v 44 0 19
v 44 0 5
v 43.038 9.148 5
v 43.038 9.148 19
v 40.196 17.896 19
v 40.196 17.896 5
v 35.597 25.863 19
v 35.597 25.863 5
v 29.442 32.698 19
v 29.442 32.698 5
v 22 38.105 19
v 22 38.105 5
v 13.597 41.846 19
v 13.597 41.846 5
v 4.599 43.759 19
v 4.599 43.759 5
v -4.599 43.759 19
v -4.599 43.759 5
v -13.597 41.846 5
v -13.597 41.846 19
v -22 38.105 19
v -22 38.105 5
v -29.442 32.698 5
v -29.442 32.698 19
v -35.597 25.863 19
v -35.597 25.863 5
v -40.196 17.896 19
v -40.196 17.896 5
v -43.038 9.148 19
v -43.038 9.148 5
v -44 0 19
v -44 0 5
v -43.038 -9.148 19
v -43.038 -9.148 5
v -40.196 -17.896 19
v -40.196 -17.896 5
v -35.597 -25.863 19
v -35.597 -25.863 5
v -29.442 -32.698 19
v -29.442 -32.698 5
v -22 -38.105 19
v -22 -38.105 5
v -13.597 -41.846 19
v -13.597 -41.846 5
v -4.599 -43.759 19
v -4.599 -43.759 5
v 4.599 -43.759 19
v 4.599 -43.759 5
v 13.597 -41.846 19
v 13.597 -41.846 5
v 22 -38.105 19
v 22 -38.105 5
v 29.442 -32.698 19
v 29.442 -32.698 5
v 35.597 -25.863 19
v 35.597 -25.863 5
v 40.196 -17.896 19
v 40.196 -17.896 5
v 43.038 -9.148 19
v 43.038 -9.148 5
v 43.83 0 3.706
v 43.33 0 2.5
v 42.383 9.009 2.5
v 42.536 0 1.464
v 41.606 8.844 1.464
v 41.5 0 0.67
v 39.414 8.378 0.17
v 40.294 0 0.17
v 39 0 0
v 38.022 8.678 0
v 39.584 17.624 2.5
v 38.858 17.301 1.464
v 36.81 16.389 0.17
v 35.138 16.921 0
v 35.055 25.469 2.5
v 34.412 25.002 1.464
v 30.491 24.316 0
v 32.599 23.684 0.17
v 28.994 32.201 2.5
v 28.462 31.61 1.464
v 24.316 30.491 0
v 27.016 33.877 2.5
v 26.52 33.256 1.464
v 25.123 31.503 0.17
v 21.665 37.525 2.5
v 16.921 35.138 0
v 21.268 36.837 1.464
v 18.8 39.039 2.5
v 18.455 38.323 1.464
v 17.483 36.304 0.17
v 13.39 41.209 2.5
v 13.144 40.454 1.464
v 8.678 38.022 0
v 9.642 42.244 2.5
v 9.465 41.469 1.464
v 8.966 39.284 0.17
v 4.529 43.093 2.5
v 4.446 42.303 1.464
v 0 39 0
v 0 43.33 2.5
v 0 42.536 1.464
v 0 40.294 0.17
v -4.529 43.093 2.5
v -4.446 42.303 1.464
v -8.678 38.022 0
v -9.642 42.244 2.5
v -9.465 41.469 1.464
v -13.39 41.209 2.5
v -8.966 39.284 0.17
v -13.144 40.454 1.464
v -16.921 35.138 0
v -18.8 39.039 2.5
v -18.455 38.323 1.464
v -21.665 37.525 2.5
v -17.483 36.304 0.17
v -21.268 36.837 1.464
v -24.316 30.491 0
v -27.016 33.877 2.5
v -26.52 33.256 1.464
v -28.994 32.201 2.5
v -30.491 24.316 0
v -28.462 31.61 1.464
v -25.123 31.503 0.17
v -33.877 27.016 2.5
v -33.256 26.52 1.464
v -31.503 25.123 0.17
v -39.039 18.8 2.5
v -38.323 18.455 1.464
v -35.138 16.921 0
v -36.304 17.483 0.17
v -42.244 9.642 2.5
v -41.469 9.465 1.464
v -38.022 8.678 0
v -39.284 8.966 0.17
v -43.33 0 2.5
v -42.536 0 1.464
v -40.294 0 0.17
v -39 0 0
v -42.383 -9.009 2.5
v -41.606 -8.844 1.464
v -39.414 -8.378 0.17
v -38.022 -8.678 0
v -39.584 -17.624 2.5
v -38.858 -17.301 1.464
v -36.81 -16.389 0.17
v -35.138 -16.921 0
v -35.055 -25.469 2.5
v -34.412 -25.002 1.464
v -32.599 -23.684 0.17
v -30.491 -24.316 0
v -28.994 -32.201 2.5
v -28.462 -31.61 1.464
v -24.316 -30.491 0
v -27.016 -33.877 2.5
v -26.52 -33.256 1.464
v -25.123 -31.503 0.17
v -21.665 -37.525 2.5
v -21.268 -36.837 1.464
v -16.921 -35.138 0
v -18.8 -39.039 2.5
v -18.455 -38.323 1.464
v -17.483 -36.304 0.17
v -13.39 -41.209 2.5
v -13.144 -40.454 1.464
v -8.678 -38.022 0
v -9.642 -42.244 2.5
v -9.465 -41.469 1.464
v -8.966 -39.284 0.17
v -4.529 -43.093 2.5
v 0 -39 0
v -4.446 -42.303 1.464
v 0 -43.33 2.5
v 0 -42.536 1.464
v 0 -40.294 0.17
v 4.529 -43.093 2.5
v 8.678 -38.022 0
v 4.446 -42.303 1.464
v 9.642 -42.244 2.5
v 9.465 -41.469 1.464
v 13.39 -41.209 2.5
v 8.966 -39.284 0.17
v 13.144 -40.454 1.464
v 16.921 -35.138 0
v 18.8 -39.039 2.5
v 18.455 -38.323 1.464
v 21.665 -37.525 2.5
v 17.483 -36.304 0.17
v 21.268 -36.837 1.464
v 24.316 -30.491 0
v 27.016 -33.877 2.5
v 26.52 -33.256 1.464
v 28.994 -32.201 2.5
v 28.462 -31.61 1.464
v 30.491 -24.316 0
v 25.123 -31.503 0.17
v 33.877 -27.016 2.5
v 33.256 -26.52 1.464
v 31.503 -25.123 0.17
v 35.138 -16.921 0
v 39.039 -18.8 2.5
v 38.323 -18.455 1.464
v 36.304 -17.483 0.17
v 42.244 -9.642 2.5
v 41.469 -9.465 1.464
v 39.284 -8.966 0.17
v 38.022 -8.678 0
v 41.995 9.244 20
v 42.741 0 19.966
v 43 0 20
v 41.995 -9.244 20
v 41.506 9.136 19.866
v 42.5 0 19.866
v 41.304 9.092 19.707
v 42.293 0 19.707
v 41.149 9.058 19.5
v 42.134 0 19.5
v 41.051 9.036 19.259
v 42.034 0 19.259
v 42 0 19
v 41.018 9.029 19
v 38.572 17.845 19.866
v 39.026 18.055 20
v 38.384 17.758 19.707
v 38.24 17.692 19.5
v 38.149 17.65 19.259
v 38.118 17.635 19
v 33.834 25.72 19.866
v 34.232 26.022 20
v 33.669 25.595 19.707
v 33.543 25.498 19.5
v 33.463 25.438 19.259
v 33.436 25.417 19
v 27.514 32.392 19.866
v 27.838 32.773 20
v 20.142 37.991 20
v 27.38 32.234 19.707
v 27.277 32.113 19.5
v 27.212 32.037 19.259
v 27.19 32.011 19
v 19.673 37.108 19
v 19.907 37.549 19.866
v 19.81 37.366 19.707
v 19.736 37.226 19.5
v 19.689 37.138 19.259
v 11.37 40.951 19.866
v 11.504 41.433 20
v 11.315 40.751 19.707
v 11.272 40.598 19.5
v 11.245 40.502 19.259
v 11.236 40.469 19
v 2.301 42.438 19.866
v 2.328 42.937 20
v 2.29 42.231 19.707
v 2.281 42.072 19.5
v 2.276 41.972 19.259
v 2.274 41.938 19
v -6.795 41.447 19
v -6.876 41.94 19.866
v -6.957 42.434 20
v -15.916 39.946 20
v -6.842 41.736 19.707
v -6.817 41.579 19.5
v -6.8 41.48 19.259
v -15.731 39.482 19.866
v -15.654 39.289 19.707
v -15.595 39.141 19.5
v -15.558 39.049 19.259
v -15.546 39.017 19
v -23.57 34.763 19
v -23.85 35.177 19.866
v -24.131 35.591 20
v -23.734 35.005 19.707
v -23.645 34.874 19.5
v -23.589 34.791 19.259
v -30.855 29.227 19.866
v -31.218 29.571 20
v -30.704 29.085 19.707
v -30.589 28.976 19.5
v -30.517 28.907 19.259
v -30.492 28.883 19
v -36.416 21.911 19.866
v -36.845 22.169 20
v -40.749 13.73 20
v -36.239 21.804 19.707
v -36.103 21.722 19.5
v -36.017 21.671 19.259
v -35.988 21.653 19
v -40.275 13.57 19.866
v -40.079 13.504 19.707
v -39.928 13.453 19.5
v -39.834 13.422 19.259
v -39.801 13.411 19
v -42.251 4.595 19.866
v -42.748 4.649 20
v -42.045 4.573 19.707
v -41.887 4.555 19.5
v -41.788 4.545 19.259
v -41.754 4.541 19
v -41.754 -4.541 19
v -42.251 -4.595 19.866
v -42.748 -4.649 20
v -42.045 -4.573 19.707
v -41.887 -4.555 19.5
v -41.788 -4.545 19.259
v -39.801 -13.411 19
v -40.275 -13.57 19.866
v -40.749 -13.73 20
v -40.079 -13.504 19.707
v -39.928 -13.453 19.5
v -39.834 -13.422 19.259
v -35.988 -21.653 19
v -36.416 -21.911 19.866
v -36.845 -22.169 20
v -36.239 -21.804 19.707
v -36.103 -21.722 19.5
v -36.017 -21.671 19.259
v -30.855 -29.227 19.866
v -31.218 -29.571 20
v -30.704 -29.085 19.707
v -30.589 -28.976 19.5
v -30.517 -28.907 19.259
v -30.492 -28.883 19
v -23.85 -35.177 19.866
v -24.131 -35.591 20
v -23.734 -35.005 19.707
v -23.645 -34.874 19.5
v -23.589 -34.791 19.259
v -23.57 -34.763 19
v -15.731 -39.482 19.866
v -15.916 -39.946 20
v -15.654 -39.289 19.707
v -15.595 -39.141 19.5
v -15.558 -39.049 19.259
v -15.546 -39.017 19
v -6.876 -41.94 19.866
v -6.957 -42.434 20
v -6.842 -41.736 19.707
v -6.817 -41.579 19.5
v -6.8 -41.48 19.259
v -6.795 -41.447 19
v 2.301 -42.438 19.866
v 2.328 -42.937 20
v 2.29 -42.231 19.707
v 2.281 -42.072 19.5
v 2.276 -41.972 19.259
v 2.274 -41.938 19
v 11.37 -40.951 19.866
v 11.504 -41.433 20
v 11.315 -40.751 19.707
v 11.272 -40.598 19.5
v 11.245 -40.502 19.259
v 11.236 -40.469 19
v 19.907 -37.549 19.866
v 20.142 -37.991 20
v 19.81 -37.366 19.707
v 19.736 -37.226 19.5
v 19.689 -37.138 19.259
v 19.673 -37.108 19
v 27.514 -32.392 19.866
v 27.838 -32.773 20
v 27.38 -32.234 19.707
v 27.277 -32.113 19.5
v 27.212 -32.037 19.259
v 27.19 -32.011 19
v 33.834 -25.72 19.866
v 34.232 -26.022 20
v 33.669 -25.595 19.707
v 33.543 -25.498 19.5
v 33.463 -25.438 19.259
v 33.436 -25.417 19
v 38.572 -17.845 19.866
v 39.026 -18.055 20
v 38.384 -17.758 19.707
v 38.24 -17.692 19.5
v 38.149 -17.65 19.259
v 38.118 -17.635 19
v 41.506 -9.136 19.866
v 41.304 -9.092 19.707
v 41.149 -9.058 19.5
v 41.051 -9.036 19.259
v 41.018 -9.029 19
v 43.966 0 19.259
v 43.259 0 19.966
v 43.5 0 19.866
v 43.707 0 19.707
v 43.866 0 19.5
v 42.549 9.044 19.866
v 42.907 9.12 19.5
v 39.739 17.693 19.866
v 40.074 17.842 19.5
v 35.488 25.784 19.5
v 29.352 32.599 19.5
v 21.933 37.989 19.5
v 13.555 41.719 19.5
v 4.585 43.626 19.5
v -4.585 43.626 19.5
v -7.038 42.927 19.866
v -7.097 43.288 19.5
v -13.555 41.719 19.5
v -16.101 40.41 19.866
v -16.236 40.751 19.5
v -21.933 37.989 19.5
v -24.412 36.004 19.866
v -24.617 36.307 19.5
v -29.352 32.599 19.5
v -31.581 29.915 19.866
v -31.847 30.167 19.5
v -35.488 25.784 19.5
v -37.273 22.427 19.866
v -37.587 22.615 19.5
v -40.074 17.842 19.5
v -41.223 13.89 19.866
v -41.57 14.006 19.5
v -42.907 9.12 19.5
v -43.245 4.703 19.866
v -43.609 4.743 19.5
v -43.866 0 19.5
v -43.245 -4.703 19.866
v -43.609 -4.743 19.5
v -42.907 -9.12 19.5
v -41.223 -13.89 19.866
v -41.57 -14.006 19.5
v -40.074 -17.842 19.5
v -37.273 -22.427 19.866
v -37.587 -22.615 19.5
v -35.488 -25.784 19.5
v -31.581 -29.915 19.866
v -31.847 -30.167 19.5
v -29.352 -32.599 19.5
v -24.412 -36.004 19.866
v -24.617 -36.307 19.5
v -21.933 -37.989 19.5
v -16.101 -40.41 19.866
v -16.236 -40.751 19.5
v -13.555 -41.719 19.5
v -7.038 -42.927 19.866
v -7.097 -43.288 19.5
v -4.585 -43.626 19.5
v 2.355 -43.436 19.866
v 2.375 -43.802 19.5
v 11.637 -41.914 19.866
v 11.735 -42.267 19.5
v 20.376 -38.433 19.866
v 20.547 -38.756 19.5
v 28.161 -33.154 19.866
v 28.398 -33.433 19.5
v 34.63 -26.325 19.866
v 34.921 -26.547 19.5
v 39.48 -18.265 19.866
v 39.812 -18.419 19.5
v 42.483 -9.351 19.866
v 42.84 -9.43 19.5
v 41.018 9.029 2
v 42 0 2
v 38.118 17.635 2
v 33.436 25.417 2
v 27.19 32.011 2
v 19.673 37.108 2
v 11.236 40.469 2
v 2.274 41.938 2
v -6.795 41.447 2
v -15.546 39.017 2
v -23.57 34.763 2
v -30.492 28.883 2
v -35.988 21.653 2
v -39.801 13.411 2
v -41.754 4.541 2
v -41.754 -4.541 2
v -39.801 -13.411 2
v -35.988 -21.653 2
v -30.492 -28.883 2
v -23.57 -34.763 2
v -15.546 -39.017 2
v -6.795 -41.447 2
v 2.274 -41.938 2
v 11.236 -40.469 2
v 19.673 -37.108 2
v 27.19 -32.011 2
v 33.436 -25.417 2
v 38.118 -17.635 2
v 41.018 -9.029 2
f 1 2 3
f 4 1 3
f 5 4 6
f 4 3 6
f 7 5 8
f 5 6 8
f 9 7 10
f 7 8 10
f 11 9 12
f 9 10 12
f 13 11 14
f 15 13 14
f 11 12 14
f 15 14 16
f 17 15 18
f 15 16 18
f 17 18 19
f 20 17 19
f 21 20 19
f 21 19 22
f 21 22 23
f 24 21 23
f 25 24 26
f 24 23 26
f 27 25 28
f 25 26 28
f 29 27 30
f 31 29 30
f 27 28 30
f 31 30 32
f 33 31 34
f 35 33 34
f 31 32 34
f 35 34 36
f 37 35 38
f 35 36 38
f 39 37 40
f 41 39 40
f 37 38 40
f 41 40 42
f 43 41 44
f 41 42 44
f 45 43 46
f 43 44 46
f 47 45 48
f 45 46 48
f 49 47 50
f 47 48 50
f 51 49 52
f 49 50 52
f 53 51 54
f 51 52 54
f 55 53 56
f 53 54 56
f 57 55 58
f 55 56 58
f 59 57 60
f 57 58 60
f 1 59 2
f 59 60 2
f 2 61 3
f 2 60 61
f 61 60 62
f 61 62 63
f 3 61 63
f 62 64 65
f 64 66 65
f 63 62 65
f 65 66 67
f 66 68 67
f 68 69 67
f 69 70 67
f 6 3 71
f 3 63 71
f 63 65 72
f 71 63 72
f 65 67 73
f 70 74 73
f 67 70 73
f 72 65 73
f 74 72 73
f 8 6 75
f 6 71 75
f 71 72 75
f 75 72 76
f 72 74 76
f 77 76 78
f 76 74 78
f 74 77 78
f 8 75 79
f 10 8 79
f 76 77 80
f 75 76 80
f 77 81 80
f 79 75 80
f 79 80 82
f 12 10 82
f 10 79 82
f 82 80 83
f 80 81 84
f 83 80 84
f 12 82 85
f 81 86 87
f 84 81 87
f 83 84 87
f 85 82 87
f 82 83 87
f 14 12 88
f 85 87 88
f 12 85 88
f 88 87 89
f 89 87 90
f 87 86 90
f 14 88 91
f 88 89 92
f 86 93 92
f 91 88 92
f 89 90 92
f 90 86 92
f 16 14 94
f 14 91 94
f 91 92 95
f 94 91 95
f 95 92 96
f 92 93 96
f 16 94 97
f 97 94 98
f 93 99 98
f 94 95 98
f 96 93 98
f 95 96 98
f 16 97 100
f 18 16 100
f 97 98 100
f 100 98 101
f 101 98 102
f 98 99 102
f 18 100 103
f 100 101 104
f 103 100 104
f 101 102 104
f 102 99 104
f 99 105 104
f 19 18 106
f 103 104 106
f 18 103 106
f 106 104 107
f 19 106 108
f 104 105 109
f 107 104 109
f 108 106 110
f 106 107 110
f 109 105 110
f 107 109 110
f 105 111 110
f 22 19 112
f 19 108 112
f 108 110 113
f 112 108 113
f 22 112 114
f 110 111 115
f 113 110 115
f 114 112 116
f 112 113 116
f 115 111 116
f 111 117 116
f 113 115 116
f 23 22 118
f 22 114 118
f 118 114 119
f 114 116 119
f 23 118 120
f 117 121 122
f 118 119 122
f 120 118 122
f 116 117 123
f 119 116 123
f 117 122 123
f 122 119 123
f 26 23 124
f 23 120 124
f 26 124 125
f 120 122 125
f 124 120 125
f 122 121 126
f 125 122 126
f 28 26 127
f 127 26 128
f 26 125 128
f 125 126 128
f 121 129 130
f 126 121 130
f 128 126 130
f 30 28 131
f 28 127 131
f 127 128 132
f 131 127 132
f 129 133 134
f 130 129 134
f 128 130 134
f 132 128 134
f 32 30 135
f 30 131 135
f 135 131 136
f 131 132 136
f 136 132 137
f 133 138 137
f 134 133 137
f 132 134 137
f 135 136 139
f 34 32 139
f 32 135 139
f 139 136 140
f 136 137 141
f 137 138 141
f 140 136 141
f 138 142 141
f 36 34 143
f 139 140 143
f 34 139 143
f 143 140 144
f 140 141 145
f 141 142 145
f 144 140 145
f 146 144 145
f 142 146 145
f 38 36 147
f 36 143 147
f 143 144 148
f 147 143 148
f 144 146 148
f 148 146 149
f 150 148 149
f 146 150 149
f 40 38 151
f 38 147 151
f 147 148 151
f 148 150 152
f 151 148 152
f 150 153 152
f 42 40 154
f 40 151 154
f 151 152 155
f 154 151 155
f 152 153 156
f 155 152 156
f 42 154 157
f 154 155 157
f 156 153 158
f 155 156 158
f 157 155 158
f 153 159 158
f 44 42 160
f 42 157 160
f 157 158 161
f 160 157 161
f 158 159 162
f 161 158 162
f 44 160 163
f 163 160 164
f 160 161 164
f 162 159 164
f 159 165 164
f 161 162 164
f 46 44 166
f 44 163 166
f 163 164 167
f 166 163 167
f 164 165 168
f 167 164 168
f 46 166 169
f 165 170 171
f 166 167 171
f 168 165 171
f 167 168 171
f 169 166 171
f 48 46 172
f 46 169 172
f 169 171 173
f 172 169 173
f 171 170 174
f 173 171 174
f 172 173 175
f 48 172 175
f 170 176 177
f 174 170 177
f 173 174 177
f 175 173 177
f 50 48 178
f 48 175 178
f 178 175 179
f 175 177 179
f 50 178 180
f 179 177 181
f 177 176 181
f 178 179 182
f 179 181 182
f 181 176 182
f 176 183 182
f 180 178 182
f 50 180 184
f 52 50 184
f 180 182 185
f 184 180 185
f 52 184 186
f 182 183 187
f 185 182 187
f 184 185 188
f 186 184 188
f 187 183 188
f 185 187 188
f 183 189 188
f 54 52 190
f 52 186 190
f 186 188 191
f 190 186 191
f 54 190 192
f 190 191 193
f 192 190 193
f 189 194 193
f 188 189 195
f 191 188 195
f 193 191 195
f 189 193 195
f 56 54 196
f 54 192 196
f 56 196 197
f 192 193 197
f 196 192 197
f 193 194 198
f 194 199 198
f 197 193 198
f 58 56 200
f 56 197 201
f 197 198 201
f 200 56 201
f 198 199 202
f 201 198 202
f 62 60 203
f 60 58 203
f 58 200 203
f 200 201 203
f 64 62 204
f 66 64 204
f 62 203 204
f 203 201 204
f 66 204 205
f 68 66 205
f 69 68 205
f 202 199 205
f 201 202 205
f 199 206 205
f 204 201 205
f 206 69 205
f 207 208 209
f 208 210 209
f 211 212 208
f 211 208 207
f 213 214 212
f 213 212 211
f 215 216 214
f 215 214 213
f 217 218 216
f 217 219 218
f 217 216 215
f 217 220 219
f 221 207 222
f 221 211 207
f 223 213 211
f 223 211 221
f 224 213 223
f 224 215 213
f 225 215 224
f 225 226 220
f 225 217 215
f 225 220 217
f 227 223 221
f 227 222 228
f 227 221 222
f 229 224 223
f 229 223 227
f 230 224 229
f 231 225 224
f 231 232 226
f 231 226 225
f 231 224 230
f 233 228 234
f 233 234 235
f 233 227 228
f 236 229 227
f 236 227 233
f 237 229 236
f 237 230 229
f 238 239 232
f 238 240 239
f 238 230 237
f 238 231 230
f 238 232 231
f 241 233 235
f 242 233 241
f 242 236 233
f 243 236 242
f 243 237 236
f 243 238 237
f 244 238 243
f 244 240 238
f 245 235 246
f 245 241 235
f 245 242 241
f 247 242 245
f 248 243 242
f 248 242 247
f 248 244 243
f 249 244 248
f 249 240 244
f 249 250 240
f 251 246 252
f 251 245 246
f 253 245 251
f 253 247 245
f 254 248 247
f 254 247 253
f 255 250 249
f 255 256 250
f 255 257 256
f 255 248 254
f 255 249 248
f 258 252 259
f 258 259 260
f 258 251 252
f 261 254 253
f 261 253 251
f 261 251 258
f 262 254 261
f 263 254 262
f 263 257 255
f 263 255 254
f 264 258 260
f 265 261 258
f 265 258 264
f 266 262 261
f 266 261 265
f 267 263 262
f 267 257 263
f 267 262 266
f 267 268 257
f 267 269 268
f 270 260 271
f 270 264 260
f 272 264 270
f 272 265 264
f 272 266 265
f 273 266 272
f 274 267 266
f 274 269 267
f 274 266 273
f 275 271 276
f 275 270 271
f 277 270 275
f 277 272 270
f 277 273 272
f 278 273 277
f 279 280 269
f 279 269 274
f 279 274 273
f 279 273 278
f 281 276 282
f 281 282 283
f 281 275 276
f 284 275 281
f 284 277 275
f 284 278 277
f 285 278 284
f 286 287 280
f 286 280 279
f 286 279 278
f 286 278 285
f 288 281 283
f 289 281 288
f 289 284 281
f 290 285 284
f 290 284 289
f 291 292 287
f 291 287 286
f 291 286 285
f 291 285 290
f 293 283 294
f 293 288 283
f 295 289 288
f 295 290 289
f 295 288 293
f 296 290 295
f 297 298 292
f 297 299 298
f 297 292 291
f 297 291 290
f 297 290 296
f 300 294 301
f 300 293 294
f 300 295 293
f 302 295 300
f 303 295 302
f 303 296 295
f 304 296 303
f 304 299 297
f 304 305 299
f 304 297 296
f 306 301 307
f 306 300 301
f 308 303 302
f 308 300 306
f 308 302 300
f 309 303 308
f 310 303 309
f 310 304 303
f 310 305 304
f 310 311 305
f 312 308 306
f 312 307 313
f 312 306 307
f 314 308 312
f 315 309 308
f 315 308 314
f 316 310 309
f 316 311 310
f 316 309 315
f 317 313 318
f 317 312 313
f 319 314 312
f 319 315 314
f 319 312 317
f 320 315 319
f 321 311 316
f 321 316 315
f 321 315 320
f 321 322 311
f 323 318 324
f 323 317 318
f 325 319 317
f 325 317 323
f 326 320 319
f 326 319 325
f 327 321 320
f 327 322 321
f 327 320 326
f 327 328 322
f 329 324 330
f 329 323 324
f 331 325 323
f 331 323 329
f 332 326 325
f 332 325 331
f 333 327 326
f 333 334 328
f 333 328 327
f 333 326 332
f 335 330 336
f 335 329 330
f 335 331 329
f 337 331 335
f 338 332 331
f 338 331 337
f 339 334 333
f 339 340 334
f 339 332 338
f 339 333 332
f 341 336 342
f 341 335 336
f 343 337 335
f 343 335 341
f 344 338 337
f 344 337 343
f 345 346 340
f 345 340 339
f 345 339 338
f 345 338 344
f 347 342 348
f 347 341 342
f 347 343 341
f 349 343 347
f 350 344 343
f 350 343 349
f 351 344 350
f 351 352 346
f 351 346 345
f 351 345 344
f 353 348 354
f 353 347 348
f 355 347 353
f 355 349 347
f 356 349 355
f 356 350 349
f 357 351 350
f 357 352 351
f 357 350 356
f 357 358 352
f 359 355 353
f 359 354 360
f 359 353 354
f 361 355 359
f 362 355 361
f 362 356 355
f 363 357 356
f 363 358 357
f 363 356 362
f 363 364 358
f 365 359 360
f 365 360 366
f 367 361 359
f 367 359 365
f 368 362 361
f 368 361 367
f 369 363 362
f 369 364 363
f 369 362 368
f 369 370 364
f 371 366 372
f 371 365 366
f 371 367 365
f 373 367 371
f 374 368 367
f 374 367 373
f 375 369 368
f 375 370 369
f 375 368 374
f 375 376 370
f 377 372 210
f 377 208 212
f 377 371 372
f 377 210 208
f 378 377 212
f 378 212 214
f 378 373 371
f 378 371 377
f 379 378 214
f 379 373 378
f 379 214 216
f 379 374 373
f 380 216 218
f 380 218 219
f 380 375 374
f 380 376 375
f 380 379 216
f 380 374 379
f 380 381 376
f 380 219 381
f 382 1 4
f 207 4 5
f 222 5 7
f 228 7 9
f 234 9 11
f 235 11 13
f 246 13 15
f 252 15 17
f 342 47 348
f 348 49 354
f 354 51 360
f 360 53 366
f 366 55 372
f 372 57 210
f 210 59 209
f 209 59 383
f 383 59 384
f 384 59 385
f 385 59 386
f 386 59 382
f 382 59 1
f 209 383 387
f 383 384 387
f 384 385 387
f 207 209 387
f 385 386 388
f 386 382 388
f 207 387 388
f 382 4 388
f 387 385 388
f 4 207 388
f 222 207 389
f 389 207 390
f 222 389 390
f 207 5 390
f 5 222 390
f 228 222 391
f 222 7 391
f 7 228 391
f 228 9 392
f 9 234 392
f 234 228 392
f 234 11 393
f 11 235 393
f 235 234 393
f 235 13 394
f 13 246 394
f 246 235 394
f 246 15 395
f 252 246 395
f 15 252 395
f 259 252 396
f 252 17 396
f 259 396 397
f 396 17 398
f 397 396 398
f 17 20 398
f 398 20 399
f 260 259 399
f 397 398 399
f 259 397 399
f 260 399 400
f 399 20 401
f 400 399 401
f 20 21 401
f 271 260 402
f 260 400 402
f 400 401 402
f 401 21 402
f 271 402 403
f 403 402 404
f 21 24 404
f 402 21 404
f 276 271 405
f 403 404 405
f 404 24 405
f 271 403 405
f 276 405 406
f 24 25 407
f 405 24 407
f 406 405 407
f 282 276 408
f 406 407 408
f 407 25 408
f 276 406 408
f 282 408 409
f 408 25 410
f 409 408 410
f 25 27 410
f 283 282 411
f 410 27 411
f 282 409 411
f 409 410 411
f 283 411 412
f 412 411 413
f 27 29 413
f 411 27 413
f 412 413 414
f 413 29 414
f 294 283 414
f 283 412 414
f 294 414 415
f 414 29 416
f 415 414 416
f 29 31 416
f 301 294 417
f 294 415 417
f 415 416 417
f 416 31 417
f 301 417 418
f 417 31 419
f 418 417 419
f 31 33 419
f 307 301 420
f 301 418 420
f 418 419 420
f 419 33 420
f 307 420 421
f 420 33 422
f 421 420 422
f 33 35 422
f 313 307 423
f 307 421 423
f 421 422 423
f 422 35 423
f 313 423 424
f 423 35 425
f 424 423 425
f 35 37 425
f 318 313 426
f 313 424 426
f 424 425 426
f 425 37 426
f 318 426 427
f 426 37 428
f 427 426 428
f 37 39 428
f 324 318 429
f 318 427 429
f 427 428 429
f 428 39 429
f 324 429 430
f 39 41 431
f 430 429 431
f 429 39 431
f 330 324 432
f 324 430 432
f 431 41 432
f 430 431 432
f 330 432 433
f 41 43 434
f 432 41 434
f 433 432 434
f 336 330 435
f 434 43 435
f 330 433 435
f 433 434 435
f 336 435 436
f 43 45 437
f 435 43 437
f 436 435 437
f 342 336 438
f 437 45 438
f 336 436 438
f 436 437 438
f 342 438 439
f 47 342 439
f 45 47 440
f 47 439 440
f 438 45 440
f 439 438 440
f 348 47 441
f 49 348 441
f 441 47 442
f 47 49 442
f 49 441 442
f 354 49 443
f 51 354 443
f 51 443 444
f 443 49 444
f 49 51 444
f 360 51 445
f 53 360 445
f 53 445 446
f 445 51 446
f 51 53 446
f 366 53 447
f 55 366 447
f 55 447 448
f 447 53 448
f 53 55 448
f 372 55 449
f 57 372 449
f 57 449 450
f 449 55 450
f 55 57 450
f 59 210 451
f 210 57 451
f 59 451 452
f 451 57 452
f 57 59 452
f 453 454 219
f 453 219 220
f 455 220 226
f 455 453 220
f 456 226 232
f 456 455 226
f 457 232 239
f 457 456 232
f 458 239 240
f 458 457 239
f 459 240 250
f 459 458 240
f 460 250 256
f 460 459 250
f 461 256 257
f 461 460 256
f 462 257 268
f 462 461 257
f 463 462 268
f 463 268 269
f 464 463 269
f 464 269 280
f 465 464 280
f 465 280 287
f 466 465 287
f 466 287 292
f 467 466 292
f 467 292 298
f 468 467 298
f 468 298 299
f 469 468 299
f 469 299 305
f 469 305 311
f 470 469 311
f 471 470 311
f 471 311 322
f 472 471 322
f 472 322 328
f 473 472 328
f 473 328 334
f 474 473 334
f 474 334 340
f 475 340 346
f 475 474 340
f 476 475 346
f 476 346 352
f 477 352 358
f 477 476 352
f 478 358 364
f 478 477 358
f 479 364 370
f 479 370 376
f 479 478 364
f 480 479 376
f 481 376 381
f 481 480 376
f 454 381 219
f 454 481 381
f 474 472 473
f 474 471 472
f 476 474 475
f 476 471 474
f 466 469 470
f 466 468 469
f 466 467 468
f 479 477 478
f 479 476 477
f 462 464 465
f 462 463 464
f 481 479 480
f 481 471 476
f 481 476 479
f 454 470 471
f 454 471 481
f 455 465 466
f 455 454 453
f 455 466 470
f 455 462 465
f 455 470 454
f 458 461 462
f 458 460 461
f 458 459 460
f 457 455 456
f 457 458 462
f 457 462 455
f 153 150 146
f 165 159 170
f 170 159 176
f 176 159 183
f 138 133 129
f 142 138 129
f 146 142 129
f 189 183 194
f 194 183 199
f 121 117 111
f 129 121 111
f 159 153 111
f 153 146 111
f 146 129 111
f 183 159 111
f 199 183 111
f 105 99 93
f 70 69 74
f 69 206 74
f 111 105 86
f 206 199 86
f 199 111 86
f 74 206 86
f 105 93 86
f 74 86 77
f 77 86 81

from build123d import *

# Parameters (mm, degrees)
F0_R     = 44
F1_DEPTH = 20
F2_T     = -2
F3_R     = 1
F4_R     = 0.99999
F5_R     = 5


# Not quite as in the source:
# - a fillet or chamfer is up to 0.001 mm smaller than in the source, because OpenCascade refuses the exact size


with BuildPart() as f1:
    # F0 (on Top) → F1 (new body)
    with BuildSketch(Plane.XY):
        Circle(F0_R)
    extrude(amount=F1_DEPTH)

    # F2
    f2_openings = [f1.faces().sort_by_distance(p)[0] for p in [
        (0, 0, 20),
    ]]
    offset(amount=F2_T, openings=f2_openings)

    # F3
    f3_edges = [f1.edges().sort_by_distance(p)[0] for p in [
        (-42, 0, 20),
    ]]
    fillet(f3_edges, radius=F3_R)

    # F4 (radius 1 in the source; OpenCascade refuses exactly that, so slightly less here)
    f4_edges = [f1.edges().sort_by_distance(p)[0] for p in [
        (-44, 0, 20),
    ]]
    fillet(f4_edges, radius=F4_R)

    # F5
    f5_edges = [f1.edges().sort_by_distance(p)[0] for p in [
        (-44, 0, 0),
    ]]
    fillet(f5_edges, radius=F5_R)


solid = f1.part
